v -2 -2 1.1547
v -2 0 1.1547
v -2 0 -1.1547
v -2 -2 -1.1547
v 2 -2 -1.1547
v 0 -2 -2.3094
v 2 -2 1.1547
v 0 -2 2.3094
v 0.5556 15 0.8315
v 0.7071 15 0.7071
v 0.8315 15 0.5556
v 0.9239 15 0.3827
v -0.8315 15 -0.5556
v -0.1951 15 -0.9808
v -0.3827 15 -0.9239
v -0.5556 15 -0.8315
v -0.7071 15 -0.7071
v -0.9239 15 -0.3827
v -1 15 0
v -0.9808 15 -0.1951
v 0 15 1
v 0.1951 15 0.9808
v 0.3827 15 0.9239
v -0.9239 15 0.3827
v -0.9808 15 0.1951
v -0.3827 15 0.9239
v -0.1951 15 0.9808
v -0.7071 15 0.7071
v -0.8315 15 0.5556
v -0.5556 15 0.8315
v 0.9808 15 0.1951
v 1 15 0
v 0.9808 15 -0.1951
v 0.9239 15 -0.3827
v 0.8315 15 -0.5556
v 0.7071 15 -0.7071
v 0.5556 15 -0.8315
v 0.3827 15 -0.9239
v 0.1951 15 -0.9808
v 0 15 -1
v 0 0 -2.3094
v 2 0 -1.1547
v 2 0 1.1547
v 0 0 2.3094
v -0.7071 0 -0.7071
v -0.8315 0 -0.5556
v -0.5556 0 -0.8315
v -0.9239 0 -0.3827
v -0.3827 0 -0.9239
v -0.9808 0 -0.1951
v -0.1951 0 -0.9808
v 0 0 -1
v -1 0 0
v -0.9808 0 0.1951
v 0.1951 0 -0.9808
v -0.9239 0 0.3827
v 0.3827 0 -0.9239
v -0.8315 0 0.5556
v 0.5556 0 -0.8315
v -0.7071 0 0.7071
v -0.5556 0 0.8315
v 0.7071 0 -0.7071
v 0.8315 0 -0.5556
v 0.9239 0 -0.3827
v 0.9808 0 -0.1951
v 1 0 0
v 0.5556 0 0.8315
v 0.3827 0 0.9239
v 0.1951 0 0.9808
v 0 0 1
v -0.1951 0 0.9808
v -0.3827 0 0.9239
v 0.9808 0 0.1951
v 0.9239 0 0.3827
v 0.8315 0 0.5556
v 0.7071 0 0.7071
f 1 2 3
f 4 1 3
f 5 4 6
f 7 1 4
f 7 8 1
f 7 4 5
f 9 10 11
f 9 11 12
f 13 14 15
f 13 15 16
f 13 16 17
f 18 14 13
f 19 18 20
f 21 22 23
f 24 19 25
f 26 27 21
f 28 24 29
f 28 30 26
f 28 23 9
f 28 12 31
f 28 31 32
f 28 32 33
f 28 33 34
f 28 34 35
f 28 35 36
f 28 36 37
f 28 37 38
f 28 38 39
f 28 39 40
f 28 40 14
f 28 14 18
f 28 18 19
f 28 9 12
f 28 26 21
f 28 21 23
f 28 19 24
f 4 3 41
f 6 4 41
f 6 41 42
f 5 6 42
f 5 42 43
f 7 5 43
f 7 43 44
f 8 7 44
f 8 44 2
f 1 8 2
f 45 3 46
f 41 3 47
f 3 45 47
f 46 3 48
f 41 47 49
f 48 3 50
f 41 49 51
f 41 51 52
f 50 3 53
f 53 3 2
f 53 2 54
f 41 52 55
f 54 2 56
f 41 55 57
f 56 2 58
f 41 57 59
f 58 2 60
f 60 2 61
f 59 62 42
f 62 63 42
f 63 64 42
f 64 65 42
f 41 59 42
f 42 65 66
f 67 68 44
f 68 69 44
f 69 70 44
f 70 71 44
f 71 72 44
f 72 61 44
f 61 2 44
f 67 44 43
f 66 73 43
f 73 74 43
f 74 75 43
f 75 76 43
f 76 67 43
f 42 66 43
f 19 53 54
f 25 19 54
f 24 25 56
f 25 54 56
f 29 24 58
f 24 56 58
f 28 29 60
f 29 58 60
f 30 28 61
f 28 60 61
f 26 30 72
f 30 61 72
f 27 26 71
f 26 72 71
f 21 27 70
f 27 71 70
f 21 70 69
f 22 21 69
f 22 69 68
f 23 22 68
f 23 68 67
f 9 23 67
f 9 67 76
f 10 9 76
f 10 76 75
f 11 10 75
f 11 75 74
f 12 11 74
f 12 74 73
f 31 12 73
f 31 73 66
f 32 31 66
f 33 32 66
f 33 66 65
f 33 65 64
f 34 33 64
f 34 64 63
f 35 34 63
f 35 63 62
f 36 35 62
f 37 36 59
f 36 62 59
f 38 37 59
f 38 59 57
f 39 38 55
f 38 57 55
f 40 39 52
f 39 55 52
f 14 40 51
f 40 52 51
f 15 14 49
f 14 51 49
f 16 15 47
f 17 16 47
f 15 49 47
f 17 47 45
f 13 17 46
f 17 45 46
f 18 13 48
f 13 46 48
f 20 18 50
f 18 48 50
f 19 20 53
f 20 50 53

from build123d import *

# Parameters (mm, degrees)
F0_R     = 1
F1_DEPTH = 2
F2_R     = 1
F3_DEPTH = 15
F4_DEPTH = 10
F5_DEPTH = 2


with BuildPart() as f1:
    # F0 (on Front) → F1 (new body)
    with BuildSketch(Plane.XZ):
        Polygon((-2, 1.1547005384), (-2, -1.1547005384), (0, -2.3094010768), (2, -1.1547005384), (2, 1.1547005384), (0, 2.3094010768), align=None)
        Circle(F0_R, mode=Mode.SUBTRACT)
        Circle(F0_R)
    extrude(amount=F1_DEPTH)

    # F2 (on face) → F3 (join)
    with BuildSketch(Plane(origin=(0, 0, 0), x_dir=(-1, 0, 0), z_dir=(0, 1, 0))):
        Circle(F2_R)
    extrude(amount=F3_DEPTH)

    # F2 (on face) → F4 (join)
    with BuildSketch(Plane(origin=(0, 0, 0), x_dir=(-1, 0, 0), z_dir=(0, 1, 0))):
        Circle(F2_R)
    extrude(amount=F4_DEPTH)

    # F0 (on Front) → F5 (join)
    with BuildSketch(Plane.XZ):
        Polygon((-2, 1.1547005384), (-2, -1.1547005384), (0, -2.3094010768), (2, -1.1547005384), (2, 1.1547005384), (0, 2.3094010768), align=None)
        Circle(F0_R, mode=Mode.SUBTRACT)
    extrude(amount=F5_DEPTH)


solid = f1.part
